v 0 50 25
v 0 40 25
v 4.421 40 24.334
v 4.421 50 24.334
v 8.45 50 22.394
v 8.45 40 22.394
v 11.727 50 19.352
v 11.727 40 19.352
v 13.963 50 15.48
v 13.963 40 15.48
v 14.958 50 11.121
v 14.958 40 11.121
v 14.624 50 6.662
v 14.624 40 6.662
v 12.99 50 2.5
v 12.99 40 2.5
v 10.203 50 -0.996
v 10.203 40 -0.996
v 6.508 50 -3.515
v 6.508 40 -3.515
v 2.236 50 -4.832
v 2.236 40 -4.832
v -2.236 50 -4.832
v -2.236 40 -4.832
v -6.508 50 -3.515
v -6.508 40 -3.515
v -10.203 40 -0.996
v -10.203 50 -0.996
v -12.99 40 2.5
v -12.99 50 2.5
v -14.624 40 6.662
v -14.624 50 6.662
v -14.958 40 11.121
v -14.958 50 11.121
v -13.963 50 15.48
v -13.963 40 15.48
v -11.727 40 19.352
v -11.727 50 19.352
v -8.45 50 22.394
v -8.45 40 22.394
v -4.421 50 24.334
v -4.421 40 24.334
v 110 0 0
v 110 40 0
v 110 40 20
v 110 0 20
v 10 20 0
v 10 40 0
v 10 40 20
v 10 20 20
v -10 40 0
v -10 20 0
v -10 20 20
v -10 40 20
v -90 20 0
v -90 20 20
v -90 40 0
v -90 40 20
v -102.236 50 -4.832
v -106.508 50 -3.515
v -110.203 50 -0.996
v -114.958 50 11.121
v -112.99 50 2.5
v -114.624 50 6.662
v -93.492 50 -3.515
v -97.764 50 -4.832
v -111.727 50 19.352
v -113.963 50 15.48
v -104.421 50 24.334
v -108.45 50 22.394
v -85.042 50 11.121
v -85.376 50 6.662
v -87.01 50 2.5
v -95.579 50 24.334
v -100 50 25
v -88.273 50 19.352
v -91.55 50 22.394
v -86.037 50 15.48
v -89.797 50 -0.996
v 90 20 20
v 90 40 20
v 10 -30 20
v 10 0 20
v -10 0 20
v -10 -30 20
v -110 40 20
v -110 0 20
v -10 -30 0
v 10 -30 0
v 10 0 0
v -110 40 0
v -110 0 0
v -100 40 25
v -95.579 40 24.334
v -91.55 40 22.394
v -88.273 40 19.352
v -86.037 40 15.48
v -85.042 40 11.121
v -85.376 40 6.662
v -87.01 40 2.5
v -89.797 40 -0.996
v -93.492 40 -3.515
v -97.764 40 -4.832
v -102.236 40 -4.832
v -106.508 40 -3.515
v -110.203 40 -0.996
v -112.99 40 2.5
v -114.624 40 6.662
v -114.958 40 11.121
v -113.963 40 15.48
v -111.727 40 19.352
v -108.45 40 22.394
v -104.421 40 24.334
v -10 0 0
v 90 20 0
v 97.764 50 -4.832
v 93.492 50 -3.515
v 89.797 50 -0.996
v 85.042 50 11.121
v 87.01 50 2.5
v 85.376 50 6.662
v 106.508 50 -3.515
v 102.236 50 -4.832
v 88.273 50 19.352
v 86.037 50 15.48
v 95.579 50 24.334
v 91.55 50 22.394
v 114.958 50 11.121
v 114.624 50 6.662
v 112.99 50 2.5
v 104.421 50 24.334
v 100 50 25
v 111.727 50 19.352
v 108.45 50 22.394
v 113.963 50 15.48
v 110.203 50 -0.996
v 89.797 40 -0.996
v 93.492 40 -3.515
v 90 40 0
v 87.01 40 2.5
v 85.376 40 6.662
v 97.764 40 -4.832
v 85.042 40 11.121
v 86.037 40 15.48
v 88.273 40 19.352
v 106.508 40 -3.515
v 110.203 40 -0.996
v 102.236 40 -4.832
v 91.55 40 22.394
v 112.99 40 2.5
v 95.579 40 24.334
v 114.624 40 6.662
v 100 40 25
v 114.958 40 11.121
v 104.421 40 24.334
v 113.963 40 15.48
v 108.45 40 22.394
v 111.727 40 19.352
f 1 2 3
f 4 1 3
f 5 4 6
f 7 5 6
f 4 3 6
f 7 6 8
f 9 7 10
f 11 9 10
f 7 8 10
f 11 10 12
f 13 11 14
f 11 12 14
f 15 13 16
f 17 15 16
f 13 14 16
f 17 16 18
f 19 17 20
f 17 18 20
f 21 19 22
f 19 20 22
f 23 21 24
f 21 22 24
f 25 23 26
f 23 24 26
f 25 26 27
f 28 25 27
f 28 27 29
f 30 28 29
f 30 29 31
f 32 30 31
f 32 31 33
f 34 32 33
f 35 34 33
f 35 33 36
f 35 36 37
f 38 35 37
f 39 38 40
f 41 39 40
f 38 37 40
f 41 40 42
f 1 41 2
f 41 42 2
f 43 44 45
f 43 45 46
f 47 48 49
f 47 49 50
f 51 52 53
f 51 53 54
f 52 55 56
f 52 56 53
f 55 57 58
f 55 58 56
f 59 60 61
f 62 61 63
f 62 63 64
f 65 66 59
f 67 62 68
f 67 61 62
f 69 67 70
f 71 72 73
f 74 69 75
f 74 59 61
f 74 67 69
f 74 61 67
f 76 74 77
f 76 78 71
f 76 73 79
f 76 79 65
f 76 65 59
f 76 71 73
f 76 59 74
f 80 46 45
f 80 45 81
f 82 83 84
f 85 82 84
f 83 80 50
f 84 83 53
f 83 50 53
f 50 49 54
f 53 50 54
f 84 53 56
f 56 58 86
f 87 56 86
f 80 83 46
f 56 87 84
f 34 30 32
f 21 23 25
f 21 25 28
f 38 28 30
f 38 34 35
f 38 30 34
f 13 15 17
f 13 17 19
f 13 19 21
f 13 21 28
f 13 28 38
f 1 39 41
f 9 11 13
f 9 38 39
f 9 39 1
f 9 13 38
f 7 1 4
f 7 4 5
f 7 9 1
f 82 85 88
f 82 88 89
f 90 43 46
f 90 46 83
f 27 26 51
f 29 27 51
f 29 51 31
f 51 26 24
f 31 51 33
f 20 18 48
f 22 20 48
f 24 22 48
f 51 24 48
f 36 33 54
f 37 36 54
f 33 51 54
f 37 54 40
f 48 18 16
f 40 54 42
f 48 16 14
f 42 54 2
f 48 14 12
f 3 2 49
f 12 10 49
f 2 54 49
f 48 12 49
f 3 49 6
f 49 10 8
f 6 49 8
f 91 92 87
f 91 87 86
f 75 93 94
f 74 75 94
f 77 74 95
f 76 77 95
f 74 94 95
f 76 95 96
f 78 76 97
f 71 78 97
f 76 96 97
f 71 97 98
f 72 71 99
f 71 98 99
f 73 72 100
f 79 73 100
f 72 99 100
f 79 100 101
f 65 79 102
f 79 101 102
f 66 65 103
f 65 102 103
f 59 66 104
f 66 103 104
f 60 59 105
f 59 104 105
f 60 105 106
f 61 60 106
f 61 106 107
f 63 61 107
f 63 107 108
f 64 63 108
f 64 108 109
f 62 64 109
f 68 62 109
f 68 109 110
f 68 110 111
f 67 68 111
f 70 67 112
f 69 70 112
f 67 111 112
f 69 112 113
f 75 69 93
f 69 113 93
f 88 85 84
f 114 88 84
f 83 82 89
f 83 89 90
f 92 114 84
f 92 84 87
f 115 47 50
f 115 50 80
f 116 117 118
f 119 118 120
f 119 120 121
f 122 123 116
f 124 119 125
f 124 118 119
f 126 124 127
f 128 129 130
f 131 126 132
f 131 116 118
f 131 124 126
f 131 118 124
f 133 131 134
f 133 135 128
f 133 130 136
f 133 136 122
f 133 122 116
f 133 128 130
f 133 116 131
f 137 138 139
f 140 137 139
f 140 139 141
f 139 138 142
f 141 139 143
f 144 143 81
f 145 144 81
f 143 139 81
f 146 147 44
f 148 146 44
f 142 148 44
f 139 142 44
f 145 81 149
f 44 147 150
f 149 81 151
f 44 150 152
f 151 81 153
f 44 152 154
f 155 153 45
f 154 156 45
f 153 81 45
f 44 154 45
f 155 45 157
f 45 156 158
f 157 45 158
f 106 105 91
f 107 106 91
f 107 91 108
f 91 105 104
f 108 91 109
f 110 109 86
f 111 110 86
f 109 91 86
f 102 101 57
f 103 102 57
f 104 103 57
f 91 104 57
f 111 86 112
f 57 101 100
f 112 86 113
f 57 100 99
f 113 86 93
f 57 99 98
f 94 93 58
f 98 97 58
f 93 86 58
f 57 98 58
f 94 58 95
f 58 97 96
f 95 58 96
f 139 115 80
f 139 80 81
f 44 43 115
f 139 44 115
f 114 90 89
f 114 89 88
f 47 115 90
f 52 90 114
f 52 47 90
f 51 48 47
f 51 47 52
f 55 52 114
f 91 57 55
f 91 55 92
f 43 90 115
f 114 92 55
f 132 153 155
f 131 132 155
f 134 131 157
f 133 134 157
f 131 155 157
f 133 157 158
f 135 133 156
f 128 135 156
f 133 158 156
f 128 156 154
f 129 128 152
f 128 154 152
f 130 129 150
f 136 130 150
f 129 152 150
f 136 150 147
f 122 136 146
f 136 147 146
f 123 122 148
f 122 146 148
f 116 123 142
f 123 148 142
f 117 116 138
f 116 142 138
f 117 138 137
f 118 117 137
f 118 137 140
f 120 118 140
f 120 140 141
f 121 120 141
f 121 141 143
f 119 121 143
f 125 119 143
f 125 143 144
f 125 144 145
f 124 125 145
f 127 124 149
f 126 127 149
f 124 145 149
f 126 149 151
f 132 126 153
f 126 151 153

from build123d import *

# Parameters (mm, degrees)
BOSS_EXTRU_1_DEPTH = 20
ESQUISSE2_W        = 20
ESQUISSE2_H        = 30
BOSS_EXTRU_2_DEPTH = 20
ESQUISSE3_R        = 15
BOSS_EXTRU_3_DEPTH = 10


with BuildPart() as part:
    # Esquisse1 → Boss.-Extru.1 (new body)
    with BuildSketch(Plane.XY):
        Polygon((110, 0), (-110, 0), (-110, 40), (-90, 40), (-90, 20), (-10, 20), (-10, 40), (10, 40), (10, 20), (90, 20), (90, 40), (110, 40), align=None)
    extrude(amount=BOSS_EXTRU_1_DEPTH)

    # Esquisse2 → Boss.-Extru.2 (add)
    with BuildSketch(Plane.XY.offset(20)):
        with Locations((0, -15)):
            Rectangle(ESQUISSE2_W, ESQUISSE2_H)
    extrude(amount=-BOSS_EXTRU_2_DEPTH)

    # Esquisse3 → Boss.-Extru.3 (add)
    with BuildSketch(Plane(origin=(0, 40, 0), x_dir=(1, 0, 0), z_dir=(0, 1, 0))):
        with Locations(Location((0, -10, 0), (0, 0, 270))):
            Circle(ESQUISSE3_R)
        with Locations(Location((-100, -10, 0), (0, 0, 270))):
            Circle(ESQUISSE3_R)
        with Locations(Location((100, -10, 0), (0, 0, 270))):
            Circle(ESQUISSE3_R)
    extrude(amount=BOSS_EXTRU_3_DEPTH)


solid = part.part
